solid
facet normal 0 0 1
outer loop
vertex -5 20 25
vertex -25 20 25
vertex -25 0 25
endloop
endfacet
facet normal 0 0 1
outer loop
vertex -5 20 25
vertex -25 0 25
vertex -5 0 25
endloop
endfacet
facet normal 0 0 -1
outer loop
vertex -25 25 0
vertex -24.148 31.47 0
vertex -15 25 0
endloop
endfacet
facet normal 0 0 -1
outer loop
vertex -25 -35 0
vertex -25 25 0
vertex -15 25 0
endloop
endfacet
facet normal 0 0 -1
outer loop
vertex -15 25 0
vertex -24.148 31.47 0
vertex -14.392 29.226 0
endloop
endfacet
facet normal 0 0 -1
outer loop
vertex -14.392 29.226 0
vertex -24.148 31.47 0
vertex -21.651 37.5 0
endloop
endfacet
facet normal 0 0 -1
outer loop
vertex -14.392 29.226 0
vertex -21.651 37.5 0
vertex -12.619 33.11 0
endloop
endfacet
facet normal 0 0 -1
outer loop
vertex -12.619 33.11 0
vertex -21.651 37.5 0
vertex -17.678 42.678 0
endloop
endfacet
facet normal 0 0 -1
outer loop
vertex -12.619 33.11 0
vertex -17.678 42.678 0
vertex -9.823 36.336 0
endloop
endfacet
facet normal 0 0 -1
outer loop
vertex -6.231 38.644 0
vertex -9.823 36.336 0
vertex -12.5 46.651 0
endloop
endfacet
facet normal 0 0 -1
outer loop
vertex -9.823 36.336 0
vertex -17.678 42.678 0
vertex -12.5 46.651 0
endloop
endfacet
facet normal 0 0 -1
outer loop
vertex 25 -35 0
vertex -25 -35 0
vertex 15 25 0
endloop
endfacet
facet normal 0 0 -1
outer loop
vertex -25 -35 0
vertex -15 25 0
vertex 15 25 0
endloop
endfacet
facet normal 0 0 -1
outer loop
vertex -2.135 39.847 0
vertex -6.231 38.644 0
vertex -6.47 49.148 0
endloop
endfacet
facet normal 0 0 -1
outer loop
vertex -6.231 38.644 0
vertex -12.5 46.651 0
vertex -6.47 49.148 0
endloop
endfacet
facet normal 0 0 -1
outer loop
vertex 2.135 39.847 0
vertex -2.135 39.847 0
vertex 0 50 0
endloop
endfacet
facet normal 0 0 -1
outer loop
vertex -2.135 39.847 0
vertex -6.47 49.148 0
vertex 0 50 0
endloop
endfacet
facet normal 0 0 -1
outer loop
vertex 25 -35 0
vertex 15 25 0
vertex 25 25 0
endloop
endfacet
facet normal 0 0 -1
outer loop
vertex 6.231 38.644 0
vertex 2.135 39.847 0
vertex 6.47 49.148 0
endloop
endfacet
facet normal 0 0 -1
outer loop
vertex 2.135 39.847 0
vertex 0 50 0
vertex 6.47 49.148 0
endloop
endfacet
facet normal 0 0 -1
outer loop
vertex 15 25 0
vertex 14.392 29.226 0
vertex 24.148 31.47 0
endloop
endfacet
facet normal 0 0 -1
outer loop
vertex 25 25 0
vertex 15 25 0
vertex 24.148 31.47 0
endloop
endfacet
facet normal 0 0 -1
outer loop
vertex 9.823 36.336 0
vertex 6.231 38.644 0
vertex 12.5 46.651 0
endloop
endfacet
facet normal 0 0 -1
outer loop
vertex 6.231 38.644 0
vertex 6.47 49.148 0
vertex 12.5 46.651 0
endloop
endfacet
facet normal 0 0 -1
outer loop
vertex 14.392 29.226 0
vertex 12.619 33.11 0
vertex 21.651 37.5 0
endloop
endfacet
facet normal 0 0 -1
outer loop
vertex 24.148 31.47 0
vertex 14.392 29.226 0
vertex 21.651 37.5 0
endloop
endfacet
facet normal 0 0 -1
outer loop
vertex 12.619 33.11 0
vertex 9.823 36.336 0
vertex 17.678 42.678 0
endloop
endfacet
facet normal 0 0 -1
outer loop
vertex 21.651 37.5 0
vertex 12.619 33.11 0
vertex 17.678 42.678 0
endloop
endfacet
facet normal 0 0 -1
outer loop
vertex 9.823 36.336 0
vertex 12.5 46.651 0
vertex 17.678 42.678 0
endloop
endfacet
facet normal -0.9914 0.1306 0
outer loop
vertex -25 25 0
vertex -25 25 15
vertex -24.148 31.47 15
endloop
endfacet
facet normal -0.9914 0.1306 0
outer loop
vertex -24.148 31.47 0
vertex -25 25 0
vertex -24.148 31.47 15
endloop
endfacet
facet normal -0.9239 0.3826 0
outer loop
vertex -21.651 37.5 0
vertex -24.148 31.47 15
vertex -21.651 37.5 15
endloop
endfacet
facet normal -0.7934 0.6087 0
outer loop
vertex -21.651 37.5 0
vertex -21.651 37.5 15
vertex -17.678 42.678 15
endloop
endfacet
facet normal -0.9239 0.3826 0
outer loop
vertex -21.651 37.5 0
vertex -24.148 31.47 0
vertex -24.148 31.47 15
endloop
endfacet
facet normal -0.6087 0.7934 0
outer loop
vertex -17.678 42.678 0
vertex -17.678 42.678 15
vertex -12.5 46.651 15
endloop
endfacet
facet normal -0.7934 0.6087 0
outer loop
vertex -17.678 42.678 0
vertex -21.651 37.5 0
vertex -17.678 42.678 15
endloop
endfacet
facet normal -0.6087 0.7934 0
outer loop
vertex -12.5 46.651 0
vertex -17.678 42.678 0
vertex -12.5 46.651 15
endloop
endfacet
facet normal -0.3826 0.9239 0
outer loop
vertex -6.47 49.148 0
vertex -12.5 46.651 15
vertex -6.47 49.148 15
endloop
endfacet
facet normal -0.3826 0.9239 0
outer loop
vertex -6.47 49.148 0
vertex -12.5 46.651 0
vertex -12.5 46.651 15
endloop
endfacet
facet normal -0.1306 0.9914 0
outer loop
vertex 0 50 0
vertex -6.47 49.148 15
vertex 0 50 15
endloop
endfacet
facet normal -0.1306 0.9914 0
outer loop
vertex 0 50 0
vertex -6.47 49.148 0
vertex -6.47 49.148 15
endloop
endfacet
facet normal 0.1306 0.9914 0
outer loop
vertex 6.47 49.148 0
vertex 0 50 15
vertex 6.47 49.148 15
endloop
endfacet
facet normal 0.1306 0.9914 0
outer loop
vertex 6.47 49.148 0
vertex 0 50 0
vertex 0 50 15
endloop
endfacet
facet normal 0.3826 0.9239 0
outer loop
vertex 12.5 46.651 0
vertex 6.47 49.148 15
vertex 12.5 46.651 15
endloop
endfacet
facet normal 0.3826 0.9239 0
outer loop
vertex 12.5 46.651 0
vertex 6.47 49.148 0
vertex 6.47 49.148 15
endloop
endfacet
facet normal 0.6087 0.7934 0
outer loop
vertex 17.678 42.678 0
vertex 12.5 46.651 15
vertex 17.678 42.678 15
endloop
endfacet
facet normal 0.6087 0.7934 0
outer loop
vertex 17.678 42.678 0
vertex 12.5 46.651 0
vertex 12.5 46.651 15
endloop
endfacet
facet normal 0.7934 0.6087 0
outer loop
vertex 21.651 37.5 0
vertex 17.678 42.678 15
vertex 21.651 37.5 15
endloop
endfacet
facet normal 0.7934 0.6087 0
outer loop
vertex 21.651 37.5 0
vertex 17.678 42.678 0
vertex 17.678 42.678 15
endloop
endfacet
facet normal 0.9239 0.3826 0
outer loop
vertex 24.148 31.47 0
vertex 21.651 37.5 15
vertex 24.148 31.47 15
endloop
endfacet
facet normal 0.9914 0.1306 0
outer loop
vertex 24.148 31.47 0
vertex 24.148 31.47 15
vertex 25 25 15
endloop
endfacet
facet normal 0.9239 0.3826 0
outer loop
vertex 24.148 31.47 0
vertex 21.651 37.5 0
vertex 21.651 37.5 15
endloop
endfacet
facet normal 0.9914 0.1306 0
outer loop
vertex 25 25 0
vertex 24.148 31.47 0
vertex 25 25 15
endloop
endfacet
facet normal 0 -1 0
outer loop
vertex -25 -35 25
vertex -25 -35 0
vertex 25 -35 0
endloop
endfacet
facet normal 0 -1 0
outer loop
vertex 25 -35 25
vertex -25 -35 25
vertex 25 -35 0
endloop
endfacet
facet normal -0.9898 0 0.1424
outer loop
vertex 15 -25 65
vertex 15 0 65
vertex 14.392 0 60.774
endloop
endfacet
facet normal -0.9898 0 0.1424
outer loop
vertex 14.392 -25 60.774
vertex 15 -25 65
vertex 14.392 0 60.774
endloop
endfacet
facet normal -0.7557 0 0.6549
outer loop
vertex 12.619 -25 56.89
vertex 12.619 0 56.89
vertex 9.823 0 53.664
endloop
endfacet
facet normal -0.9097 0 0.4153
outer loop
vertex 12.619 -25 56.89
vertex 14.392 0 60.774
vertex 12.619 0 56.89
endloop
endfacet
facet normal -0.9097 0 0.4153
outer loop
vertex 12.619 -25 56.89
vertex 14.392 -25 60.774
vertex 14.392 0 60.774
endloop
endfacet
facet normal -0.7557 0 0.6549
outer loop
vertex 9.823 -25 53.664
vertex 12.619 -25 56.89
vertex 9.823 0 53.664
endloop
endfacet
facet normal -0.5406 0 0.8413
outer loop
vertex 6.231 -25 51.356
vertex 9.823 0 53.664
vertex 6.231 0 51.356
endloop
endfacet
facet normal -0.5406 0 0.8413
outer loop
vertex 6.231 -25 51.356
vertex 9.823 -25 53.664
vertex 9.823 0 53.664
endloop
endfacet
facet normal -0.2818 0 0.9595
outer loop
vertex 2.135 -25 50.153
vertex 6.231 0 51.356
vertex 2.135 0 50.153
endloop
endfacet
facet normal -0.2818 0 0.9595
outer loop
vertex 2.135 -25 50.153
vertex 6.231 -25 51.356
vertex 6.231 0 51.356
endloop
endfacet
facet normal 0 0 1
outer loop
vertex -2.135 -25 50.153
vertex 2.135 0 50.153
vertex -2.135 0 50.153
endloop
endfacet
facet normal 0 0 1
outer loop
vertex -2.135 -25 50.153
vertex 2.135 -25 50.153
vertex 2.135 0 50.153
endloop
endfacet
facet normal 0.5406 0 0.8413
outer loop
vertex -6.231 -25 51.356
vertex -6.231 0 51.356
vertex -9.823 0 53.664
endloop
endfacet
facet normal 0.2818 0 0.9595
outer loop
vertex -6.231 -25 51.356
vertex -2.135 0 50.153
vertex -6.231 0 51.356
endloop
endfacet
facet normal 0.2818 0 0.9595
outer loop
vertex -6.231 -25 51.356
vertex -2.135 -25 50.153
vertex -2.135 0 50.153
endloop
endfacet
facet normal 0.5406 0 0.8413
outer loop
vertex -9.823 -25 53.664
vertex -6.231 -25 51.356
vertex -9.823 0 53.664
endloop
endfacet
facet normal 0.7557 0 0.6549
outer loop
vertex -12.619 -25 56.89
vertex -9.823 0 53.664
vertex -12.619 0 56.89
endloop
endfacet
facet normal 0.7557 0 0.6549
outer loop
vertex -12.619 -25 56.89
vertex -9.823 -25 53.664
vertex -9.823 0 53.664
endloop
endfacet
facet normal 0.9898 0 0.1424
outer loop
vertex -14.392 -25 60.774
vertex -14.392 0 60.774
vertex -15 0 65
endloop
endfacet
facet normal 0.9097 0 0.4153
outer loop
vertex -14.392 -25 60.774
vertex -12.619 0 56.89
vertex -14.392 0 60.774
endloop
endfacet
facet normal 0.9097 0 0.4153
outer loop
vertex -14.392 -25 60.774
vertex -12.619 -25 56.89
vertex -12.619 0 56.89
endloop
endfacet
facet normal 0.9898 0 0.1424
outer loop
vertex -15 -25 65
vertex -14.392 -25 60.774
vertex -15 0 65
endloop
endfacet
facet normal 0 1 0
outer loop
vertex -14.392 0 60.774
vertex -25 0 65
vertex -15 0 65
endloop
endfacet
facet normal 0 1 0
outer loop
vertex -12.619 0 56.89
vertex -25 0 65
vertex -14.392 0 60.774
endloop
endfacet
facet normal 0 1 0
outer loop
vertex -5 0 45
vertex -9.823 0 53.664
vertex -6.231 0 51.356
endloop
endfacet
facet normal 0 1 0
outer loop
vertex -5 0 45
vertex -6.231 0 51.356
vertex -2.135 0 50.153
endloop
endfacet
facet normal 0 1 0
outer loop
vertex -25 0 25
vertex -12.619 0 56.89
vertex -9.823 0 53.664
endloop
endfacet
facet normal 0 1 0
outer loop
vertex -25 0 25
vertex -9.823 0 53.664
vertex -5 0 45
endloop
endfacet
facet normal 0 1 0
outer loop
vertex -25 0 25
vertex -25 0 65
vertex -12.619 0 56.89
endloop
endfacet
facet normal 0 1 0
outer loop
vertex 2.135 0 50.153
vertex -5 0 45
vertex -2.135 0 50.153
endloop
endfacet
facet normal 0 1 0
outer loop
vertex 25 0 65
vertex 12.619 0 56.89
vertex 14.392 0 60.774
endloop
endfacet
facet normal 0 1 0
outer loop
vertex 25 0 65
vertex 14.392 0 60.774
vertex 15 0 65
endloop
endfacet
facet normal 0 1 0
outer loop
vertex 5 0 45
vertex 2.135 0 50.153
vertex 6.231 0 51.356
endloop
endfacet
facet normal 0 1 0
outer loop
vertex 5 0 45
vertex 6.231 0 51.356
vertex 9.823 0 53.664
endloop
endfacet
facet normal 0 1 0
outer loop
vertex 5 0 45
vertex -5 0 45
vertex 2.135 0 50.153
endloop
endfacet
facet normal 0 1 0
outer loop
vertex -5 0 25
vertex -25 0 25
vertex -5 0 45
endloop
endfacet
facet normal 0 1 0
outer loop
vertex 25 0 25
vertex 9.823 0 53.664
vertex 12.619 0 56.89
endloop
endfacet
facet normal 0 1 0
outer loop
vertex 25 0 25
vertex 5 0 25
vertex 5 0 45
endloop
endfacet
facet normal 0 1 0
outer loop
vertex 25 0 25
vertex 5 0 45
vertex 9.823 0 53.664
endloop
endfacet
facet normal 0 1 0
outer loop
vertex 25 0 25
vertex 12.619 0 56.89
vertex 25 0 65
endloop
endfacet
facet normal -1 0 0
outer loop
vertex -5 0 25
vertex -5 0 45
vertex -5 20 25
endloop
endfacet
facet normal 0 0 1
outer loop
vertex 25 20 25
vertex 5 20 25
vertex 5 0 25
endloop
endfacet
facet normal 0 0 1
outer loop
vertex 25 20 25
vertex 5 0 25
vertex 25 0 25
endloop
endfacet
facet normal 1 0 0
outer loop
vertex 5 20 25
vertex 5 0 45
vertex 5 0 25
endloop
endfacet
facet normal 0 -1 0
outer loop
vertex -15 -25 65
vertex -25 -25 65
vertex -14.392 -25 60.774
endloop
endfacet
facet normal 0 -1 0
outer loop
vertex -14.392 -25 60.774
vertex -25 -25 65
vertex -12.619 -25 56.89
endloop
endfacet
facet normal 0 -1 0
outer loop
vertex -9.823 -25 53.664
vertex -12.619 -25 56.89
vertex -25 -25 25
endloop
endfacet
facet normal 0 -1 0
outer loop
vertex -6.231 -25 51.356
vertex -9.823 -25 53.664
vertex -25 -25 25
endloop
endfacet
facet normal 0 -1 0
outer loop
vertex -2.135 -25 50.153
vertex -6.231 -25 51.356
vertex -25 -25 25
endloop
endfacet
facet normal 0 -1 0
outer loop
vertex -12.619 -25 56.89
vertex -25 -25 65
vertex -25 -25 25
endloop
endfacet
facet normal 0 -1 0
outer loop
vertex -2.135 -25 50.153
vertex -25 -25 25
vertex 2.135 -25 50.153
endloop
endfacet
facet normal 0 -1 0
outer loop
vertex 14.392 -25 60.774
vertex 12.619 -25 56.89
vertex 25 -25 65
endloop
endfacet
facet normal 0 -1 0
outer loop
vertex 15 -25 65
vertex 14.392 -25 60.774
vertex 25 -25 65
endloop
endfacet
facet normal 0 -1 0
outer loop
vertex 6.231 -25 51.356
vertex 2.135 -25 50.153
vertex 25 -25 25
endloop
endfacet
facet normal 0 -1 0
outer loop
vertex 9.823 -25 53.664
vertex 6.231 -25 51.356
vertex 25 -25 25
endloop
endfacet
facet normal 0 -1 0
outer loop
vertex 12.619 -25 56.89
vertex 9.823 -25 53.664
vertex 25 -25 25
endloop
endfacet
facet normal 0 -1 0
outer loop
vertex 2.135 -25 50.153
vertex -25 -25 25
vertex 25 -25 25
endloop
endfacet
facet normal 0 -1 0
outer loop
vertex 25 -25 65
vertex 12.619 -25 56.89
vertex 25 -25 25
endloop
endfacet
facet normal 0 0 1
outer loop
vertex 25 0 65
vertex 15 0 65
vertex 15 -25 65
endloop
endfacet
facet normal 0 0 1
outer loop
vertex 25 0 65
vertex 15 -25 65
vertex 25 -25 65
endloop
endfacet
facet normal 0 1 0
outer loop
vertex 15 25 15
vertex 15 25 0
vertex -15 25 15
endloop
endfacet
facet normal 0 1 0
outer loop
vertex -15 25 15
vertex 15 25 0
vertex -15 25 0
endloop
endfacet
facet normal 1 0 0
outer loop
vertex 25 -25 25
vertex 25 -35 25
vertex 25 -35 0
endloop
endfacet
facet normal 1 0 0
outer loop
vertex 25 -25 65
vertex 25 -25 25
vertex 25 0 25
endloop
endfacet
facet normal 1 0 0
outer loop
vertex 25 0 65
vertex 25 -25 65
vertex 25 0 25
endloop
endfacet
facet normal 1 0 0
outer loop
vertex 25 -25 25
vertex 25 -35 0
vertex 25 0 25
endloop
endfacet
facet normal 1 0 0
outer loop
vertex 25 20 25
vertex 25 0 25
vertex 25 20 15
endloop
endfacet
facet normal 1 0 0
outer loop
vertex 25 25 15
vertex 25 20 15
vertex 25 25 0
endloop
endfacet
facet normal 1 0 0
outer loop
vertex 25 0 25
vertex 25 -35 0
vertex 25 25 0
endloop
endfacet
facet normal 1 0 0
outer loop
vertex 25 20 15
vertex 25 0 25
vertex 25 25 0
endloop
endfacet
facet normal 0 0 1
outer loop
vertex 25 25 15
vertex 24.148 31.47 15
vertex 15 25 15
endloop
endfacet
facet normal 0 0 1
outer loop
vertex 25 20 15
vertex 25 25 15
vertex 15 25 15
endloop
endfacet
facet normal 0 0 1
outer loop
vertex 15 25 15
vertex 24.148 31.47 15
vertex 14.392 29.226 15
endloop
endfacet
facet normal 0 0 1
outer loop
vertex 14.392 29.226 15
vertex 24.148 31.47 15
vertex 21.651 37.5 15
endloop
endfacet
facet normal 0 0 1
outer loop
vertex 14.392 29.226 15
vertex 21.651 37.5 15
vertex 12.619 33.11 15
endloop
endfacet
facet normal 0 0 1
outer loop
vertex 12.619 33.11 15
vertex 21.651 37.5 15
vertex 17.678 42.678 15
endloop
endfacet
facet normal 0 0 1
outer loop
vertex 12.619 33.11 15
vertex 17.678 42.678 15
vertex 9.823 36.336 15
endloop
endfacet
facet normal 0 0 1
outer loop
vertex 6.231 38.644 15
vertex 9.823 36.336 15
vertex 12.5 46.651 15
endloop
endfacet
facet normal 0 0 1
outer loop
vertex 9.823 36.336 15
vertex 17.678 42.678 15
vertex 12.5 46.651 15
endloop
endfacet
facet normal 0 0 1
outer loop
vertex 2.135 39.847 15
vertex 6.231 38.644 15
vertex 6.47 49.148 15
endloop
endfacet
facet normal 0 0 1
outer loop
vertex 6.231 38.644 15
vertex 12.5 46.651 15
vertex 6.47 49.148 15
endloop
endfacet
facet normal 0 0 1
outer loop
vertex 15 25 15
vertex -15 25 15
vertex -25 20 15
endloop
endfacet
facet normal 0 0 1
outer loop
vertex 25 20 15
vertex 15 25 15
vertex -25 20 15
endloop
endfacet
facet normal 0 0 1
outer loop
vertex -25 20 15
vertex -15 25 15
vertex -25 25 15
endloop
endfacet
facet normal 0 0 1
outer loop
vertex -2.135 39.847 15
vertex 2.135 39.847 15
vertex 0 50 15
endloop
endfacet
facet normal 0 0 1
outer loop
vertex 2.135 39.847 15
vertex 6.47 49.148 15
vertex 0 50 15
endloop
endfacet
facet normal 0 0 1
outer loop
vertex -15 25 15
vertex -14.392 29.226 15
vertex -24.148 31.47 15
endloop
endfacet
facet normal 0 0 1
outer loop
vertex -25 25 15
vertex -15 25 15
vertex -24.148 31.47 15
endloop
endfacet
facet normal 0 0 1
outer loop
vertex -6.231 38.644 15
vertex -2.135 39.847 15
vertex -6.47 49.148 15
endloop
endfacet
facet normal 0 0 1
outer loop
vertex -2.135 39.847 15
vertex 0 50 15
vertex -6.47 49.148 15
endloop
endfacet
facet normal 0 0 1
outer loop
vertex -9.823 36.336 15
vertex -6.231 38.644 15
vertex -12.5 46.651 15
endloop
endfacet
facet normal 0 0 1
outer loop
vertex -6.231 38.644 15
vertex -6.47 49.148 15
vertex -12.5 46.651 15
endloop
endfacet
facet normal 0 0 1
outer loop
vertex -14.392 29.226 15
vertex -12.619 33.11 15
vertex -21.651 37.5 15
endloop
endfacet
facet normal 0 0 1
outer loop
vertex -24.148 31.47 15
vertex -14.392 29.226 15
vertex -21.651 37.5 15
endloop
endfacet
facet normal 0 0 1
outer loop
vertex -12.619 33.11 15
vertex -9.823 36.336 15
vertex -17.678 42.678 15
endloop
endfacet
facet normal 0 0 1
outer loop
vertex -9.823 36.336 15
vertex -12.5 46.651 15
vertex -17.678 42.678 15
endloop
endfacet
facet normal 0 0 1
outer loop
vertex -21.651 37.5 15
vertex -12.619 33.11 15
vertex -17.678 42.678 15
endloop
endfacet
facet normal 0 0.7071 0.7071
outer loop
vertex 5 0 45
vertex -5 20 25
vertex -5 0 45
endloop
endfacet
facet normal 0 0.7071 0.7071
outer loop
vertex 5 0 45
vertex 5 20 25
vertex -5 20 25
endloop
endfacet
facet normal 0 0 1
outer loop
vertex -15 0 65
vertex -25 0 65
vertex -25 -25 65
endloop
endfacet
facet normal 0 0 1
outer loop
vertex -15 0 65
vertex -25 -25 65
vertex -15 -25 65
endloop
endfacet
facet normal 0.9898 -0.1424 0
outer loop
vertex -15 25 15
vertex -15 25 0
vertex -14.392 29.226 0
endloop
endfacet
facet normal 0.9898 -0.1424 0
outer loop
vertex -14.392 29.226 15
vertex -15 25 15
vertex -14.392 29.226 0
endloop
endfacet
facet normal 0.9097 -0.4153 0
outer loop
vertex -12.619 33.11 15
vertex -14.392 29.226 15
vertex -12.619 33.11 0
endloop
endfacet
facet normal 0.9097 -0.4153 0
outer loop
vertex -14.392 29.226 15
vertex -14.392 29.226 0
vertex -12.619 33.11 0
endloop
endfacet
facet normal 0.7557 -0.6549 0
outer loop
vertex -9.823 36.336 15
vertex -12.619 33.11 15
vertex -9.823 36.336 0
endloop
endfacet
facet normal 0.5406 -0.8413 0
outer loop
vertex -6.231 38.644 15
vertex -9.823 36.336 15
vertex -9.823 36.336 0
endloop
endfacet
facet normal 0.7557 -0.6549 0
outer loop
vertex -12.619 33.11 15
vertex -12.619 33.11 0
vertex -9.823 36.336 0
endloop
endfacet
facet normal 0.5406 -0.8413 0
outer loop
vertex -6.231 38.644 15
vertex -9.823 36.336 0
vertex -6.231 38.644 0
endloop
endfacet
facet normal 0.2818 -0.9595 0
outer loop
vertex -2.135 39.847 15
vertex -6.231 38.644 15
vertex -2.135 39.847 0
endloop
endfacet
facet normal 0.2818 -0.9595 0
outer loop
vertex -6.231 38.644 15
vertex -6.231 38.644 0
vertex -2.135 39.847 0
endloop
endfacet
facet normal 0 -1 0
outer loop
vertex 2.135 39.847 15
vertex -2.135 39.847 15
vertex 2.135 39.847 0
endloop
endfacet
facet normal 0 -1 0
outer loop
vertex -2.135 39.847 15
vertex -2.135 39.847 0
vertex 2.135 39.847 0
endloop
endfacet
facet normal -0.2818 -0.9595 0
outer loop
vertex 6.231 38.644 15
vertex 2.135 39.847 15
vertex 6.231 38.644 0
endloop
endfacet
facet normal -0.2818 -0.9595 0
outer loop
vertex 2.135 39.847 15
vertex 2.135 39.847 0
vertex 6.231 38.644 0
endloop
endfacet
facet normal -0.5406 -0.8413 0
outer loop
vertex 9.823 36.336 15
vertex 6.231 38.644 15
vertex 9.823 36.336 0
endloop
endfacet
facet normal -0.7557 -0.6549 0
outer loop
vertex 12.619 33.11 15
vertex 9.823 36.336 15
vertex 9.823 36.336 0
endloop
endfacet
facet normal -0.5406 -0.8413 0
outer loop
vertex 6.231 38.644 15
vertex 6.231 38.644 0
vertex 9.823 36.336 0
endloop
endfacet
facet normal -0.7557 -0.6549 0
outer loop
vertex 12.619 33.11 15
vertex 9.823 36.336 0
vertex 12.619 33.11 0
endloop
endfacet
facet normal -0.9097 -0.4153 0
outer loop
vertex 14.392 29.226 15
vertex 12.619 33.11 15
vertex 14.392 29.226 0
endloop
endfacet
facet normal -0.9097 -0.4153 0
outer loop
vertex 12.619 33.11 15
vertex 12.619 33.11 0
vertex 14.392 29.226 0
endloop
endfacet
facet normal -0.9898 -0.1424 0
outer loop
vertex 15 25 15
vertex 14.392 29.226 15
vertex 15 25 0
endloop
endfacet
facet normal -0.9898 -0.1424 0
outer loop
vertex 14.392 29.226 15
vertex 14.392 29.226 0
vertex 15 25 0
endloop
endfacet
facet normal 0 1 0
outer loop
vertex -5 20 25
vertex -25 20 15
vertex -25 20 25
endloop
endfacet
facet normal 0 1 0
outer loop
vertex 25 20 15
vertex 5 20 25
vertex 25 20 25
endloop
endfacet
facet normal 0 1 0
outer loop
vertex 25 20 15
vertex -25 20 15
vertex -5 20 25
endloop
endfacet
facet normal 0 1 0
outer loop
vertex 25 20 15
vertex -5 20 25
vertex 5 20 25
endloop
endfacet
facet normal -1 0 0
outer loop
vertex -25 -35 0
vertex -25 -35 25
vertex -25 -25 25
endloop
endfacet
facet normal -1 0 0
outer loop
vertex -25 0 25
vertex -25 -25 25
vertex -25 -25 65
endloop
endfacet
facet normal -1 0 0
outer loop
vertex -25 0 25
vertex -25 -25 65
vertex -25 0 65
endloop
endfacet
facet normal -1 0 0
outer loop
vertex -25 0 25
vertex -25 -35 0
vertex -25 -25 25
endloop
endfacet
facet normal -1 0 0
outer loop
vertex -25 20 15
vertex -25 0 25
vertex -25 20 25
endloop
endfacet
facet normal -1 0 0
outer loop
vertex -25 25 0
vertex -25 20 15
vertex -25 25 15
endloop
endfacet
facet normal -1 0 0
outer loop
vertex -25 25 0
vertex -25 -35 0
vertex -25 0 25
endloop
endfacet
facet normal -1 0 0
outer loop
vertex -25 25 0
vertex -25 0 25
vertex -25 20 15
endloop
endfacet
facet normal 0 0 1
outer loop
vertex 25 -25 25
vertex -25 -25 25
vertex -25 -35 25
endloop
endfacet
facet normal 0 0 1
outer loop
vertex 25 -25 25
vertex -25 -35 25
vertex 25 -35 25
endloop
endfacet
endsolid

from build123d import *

# Parameters (mm, degrees)
BOSS_EXTRUDE1_DEPTH     = 15
SKETCH3_3_W             = 50
SKETCH3_3_H             = 20
BOSS_EXTRUDE2_DEPTH     = 25
SKETCH3_4_W             = 50
SKETCH3_4_H             = 25
BOSS_EXTRUDE3_DEPTH     = 65
SKETCH3_6_W             = 50
SKETCH3_6_H             = 10
BOSS_EXTRUDE4_DEPTH     = 25
CUT_EXTRUDE1_DEPTH      = 86.732140997
CUT_EXTRUDE1_DEPTH_BACK = 86.732140997
BOSS_EXTRUDE5_DEPTH     = 5


with BuildPart() as part:
    # Sketch3 → Boss-Extrude1 (new body)
    with BuildSketch(Plane.XY):
        with BuildLine():
            Line((-25, 20), (25, 20))
            Line((25, 20), (25, 25))
            ThreePointArc((25, 25), (0, 50), (-25, 25))
            Line((-25, 25), (-25, 20))
        make_face()
        with BuildLine():
            ThreePointArc((-15, 25), (0, 40), (15, 25))
            Line((15, 25), (-15, 25))
        make_face(mode=Mode.SUBTRACT)
    extrude(amount=BOSS_EXTRUDE1_DEPTH)

    # Sketch3<3> → Boss-Extrude2 (add)
    with BuildSketch(Plane.XY):
        with Locations((0, 10)):
            Rectangle(SKETCH3_3_W, SKETCH3_3_H)
    extrude(amount=BOSS_EXTRUDE2_DEPTH)

    # Sketch3<4> → Boss-Extrude3 (add)
    with BuildSketch(Plane.XY):
        with Locations((0, -12.5)):
            Rectangle(SKETCH3_4_W, SKETCH3_4_H)
    extrude(amount=BOSS_EXTRUDE3_DEPTH)

    # Sketch3<6> → Boss-Extrude4 (add)
    with BuildSketch(Plane.XY):
        with Locations((0, -30)):
            Rectangle(SKETCH3_6_W, SKETCH3_6_H)
    extrude(amount=BOSS_EXTRUDE4_DEPTH)

    # Sketch5 → Cut-Extrude1 (cut, two sides: drawn at the far end of the back side and taken through both)
    with BuildSketch(Plane(origin=(0, 0, 0), x_dir=(1, 0, 0), z_dir=(0, 1, 0)).offset(-CUT_EXTRUDE1_DEPTH_BACK)):
        with BuildLine():
            Line((-15, -65), (15, -65))
            ThreePointArc((15, -65), (0, -50), (-15, -65))
        make_face()
    extrude(amount=CUT_EXTRUDE1_DEPTH + CUT_EXTRUDE1_DEPTH_BACK, mode=Mode.SUBTRACT)

    # Sketch6 → Boss-Extrude5 (add, symmetric)
    with BuildSketch(Plane(origin=(0, 0, 0), x_dir=(0, 0, -1), z_dir=(1, 0, 0))):
        Polygon((-25, 20), (-45, 0), (-25, 0), align=None)
    extrude(amount=BOSS_EXTRUDE5_DEPTH, both=True)


solid = part.part
